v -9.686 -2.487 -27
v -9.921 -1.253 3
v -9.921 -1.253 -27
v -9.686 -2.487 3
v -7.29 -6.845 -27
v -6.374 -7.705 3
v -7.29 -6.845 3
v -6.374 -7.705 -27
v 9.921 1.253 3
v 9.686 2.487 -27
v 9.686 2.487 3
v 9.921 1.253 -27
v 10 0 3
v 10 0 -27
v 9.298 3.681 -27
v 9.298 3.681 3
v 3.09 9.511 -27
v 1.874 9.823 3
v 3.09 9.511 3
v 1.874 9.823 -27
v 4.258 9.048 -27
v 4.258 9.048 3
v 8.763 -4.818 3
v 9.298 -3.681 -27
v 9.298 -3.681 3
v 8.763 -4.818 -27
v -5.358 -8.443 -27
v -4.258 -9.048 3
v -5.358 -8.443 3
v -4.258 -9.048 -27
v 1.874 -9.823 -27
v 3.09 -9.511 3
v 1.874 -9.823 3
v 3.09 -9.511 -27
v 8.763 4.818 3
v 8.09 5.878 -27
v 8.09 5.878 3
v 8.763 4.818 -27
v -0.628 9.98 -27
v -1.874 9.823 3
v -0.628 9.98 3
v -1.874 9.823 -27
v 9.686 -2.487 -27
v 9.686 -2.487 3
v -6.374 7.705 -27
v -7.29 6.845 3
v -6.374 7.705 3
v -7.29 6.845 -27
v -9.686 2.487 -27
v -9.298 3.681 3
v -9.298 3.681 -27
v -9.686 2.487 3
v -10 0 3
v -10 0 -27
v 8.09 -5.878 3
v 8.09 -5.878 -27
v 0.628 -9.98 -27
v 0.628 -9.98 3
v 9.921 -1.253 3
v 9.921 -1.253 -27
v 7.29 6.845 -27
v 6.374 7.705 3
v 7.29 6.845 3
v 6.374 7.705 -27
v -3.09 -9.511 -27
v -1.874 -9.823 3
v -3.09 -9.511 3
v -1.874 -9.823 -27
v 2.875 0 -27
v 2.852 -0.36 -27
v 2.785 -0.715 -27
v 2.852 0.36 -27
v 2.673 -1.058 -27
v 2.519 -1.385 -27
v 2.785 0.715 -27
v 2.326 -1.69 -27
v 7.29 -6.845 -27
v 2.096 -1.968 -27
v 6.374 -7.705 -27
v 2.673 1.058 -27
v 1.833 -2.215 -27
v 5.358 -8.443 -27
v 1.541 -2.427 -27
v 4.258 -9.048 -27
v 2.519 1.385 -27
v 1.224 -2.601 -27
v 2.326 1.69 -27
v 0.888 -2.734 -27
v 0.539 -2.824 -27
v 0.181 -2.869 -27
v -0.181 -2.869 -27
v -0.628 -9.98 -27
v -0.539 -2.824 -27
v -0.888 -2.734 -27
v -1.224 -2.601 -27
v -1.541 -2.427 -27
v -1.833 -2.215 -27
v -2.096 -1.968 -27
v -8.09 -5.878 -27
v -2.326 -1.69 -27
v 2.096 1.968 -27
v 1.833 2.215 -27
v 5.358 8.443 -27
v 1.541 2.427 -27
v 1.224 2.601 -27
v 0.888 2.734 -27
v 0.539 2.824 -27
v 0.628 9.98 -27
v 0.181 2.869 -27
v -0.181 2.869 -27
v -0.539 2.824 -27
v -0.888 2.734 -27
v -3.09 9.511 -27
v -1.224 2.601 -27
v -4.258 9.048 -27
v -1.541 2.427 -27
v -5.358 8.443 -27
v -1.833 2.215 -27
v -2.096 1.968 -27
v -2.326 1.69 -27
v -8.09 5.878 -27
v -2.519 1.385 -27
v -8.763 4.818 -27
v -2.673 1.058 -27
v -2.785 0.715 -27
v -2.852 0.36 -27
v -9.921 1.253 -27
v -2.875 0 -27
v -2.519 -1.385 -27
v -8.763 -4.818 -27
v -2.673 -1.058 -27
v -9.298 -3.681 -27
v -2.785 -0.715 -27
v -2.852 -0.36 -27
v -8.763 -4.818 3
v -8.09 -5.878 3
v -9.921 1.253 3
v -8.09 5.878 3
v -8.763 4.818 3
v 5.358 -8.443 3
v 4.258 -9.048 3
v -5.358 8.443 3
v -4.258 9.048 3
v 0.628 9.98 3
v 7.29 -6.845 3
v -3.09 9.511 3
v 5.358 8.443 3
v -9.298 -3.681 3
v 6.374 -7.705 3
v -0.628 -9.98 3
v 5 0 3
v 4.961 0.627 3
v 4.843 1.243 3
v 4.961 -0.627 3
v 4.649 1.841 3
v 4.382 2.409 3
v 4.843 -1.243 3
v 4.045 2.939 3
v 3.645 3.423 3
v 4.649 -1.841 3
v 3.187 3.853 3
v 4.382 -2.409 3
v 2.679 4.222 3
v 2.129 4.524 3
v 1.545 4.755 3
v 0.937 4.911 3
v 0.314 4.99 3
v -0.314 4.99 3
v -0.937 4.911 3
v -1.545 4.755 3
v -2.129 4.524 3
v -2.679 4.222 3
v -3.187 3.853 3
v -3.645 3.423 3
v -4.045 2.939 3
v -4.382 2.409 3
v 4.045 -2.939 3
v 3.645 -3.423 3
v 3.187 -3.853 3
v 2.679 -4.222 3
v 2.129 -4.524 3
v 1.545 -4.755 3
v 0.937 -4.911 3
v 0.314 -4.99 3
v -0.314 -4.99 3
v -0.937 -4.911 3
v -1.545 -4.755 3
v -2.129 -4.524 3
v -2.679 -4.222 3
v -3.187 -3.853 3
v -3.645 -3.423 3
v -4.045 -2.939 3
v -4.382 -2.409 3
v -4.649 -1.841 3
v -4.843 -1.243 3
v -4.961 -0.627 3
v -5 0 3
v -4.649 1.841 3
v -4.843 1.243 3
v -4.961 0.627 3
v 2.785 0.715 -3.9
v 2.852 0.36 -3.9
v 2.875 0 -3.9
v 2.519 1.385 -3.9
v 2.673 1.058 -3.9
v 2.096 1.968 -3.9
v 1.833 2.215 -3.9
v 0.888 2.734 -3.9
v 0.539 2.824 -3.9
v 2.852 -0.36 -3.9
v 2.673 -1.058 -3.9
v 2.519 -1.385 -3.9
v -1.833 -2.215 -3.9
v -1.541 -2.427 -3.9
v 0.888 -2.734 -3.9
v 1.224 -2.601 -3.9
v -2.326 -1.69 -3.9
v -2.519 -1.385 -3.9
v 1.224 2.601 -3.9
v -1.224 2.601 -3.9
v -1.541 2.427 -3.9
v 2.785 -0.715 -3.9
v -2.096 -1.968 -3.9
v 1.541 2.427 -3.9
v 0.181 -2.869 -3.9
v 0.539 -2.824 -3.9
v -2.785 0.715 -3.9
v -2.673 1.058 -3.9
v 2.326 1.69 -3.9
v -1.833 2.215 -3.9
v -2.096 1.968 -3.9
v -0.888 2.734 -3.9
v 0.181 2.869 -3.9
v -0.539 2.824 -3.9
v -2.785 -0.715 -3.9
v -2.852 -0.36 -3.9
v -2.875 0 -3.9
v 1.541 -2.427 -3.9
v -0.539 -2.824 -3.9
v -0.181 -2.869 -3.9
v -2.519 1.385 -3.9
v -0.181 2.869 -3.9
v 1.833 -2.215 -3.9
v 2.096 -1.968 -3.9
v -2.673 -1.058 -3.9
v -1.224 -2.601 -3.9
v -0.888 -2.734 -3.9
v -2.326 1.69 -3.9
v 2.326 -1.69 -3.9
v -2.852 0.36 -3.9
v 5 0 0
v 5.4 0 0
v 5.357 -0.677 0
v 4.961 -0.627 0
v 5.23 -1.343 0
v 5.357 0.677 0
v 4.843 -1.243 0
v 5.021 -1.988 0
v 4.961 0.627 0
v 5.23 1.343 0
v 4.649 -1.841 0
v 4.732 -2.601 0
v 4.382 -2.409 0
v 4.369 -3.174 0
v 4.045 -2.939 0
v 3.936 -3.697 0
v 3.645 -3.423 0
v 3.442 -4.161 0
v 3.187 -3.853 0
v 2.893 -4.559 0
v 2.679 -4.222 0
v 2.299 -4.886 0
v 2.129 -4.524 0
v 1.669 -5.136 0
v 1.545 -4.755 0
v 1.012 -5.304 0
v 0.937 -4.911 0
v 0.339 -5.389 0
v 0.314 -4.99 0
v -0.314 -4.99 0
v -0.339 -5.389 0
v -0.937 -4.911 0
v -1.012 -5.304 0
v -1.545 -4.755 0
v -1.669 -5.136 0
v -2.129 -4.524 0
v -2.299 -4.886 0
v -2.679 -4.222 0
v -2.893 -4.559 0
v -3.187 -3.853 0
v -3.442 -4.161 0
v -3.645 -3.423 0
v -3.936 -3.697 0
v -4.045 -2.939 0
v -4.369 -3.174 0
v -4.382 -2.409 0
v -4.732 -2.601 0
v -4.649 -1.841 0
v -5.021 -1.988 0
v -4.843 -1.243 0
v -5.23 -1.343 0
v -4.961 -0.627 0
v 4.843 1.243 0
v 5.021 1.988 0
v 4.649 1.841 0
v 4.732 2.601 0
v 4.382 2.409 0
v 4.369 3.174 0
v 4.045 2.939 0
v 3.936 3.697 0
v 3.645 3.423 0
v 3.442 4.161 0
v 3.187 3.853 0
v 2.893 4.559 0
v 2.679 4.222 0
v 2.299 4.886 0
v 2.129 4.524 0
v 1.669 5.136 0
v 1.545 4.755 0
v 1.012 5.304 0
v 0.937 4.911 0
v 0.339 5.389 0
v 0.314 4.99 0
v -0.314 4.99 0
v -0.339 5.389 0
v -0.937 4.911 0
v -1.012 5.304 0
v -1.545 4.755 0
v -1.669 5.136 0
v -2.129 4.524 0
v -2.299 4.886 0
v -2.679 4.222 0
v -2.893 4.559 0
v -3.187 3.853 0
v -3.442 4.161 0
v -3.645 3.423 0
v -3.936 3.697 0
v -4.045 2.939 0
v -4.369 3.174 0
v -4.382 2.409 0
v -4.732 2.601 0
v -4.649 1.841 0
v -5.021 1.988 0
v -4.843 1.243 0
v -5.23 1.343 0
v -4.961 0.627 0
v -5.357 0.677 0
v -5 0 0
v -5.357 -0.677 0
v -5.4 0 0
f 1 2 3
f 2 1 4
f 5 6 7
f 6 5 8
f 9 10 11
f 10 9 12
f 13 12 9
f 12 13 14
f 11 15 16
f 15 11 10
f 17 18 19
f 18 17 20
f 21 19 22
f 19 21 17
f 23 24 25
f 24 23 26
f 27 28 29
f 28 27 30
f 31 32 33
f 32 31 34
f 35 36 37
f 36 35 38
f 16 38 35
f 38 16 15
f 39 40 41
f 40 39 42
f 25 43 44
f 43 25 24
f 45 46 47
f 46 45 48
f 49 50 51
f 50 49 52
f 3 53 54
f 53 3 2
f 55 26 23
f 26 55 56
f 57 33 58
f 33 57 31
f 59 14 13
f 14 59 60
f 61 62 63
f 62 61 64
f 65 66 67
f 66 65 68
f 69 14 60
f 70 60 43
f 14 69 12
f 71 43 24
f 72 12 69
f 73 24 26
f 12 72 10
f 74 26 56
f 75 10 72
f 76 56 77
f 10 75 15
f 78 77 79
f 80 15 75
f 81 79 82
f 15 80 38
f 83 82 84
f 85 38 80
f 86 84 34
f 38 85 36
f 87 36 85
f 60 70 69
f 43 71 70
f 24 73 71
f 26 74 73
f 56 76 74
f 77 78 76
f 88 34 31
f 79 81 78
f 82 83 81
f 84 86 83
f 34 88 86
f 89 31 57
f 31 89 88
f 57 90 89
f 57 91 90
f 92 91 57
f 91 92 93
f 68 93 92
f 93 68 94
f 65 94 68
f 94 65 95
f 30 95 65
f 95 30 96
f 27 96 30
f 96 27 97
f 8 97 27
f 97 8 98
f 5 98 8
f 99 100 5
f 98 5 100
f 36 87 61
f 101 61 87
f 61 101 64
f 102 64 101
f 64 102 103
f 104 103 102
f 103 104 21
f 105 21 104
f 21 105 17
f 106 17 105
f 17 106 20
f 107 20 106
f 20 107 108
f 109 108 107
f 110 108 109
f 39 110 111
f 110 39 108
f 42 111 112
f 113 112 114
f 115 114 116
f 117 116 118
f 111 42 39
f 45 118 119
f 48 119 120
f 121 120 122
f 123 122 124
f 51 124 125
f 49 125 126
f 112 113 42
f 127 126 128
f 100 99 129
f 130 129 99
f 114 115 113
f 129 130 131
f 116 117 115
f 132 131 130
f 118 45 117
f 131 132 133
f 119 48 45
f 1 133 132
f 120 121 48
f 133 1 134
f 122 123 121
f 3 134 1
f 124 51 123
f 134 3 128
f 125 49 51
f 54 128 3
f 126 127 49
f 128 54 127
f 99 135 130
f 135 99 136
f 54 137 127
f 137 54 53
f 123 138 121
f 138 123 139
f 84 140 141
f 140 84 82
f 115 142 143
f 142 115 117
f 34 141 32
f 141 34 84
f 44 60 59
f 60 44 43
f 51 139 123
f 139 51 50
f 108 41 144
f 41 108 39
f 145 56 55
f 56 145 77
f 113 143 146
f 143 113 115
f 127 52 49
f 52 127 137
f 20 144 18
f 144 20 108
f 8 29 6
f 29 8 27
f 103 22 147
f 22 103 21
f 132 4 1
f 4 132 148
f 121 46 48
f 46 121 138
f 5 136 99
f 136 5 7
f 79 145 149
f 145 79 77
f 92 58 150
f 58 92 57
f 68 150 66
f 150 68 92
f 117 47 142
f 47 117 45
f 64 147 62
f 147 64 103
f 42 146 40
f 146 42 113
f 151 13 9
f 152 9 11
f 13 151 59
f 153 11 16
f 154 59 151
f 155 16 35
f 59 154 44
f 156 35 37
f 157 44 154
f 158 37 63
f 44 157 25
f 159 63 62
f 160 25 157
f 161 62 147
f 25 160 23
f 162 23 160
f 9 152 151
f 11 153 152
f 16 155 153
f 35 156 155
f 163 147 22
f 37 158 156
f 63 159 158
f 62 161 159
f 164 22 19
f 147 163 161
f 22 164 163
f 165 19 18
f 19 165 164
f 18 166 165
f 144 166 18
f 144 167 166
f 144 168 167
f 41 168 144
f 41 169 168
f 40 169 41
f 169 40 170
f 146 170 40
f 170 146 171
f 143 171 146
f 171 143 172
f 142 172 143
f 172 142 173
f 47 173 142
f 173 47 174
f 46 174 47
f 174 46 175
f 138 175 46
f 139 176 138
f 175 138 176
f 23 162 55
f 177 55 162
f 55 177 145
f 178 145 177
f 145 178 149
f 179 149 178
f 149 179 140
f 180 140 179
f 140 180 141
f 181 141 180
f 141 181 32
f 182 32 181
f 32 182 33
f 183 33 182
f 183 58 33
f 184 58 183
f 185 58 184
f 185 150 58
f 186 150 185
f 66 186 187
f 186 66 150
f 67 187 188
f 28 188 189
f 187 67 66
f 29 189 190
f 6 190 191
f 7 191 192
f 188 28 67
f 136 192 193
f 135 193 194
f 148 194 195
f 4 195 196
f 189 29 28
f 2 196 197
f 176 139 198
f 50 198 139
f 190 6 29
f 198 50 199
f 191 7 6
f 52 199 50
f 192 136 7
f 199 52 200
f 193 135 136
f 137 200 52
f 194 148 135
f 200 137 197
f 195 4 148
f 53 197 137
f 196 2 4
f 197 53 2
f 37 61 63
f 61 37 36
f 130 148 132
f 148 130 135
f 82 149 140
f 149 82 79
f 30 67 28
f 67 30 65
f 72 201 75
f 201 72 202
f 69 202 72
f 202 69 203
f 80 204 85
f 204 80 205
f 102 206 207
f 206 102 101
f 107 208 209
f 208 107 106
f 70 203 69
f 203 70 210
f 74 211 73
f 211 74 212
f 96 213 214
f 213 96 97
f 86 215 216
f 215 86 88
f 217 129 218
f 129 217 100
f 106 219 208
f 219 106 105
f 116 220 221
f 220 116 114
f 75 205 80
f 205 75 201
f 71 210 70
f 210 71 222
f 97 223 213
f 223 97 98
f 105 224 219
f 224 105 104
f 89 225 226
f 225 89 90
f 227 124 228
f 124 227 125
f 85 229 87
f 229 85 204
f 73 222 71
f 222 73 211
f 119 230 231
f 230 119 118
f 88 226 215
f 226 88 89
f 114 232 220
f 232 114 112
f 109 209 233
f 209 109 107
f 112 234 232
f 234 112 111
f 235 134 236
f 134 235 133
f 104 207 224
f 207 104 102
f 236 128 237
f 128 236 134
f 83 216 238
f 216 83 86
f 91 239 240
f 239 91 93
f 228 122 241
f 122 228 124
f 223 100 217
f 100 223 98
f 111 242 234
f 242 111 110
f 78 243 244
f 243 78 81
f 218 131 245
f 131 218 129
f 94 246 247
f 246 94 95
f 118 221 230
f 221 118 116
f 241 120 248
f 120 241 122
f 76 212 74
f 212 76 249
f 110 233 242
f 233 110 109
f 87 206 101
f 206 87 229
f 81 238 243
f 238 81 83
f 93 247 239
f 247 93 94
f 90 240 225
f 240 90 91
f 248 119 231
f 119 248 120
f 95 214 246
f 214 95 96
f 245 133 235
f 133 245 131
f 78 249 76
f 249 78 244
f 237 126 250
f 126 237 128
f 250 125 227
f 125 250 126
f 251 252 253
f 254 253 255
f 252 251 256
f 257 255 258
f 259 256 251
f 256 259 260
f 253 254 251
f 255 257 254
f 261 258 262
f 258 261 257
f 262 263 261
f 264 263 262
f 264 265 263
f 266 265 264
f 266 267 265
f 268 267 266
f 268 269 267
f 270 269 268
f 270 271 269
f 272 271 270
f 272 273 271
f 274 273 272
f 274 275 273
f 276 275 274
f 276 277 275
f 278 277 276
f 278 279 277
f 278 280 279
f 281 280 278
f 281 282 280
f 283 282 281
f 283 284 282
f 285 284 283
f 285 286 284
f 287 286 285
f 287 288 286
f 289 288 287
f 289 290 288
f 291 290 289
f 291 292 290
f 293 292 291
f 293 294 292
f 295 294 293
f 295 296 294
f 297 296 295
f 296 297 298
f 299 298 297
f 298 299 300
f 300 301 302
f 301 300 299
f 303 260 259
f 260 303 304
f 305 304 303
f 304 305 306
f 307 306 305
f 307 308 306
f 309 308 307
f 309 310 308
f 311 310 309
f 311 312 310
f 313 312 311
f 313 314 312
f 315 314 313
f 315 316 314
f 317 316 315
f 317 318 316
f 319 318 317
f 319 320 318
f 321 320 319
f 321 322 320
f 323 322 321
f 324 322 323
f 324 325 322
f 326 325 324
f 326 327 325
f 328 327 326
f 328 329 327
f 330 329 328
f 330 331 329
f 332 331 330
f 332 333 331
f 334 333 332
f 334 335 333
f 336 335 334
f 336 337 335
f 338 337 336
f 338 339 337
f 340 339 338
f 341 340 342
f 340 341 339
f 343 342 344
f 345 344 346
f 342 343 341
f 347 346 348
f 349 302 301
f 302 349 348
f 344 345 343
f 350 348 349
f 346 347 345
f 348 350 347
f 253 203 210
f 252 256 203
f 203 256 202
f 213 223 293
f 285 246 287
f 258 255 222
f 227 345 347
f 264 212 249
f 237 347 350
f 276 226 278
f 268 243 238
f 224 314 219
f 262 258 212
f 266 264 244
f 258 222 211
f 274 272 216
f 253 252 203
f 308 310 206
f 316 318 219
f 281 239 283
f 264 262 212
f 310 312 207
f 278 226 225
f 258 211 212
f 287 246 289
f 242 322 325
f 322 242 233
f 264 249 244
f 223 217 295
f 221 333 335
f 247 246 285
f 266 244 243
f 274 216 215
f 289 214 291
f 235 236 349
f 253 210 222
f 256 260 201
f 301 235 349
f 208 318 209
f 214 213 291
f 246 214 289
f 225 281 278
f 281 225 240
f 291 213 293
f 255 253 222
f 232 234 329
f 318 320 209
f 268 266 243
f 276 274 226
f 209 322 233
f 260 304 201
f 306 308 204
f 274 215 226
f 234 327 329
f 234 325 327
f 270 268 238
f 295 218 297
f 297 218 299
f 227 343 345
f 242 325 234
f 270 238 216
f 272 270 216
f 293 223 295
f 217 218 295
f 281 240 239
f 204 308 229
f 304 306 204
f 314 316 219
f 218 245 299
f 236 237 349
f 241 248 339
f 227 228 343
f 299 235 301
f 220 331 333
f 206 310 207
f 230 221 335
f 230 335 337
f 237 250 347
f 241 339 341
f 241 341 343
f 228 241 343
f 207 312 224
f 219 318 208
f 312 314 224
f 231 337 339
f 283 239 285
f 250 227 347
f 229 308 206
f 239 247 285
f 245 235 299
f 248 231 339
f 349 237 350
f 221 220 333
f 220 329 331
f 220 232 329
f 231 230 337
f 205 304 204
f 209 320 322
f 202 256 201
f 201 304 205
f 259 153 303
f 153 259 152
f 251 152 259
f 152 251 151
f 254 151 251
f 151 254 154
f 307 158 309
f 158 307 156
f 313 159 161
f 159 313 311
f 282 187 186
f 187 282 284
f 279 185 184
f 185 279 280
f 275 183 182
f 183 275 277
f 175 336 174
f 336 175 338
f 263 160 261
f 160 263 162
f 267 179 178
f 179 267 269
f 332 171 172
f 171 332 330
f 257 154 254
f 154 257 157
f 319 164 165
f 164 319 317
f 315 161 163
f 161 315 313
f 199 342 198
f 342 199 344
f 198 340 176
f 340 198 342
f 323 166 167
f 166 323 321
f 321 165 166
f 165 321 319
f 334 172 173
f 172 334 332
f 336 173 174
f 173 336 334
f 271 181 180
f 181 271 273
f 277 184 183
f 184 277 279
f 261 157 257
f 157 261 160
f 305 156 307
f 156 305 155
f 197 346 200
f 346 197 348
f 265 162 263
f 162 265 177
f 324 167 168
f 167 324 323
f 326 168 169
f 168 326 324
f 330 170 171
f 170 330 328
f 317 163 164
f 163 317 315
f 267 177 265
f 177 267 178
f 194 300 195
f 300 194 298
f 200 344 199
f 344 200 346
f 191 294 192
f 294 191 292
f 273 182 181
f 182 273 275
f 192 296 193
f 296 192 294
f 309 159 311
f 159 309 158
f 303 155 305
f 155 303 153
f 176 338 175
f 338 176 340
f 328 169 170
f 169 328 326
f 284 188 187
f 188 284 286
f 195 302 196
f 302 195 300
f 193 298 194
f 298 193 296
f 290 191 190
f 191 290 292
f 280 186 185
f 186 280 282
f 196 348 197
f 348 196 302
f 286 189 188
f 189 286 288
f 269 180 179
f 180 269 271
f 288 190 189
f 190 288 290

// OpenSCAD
$fn = 50;

difference() {
	union() {
		translate(v = [0, 0, -27.0]) {
			cylinder(h = 30, r = 10.0);
		}
		#translate(v = [0, 0, -30.0]) {
			cylinder(h = 30, r = 2.875);
		}
	}
	union() {
		translate(v = [0, 0, 0]) {
			rotate(a = [0, 0, 0]) {
				difference() {
					union() {
						translate(v = [0, 0, -30.0]) {
							cylinder(h = 30, r = 2.6);
						}
						translate(v = [0, 0, -3.9]) {
							cylinder(h = 3.9, r1 = 2.875, r2 = 5.4);
						}
						translate(v = [0, 0, -30.0]) {
							cylinder(h = 30, r = 2.875);
						}
						translate(v = [0, 0, -30.0]) {
							cylinder(h = 30, r = 2.6);
						}
					}
					union();
				}
			}
		}
		#cylinder(h = 3, r = 5.0);
	}
}
